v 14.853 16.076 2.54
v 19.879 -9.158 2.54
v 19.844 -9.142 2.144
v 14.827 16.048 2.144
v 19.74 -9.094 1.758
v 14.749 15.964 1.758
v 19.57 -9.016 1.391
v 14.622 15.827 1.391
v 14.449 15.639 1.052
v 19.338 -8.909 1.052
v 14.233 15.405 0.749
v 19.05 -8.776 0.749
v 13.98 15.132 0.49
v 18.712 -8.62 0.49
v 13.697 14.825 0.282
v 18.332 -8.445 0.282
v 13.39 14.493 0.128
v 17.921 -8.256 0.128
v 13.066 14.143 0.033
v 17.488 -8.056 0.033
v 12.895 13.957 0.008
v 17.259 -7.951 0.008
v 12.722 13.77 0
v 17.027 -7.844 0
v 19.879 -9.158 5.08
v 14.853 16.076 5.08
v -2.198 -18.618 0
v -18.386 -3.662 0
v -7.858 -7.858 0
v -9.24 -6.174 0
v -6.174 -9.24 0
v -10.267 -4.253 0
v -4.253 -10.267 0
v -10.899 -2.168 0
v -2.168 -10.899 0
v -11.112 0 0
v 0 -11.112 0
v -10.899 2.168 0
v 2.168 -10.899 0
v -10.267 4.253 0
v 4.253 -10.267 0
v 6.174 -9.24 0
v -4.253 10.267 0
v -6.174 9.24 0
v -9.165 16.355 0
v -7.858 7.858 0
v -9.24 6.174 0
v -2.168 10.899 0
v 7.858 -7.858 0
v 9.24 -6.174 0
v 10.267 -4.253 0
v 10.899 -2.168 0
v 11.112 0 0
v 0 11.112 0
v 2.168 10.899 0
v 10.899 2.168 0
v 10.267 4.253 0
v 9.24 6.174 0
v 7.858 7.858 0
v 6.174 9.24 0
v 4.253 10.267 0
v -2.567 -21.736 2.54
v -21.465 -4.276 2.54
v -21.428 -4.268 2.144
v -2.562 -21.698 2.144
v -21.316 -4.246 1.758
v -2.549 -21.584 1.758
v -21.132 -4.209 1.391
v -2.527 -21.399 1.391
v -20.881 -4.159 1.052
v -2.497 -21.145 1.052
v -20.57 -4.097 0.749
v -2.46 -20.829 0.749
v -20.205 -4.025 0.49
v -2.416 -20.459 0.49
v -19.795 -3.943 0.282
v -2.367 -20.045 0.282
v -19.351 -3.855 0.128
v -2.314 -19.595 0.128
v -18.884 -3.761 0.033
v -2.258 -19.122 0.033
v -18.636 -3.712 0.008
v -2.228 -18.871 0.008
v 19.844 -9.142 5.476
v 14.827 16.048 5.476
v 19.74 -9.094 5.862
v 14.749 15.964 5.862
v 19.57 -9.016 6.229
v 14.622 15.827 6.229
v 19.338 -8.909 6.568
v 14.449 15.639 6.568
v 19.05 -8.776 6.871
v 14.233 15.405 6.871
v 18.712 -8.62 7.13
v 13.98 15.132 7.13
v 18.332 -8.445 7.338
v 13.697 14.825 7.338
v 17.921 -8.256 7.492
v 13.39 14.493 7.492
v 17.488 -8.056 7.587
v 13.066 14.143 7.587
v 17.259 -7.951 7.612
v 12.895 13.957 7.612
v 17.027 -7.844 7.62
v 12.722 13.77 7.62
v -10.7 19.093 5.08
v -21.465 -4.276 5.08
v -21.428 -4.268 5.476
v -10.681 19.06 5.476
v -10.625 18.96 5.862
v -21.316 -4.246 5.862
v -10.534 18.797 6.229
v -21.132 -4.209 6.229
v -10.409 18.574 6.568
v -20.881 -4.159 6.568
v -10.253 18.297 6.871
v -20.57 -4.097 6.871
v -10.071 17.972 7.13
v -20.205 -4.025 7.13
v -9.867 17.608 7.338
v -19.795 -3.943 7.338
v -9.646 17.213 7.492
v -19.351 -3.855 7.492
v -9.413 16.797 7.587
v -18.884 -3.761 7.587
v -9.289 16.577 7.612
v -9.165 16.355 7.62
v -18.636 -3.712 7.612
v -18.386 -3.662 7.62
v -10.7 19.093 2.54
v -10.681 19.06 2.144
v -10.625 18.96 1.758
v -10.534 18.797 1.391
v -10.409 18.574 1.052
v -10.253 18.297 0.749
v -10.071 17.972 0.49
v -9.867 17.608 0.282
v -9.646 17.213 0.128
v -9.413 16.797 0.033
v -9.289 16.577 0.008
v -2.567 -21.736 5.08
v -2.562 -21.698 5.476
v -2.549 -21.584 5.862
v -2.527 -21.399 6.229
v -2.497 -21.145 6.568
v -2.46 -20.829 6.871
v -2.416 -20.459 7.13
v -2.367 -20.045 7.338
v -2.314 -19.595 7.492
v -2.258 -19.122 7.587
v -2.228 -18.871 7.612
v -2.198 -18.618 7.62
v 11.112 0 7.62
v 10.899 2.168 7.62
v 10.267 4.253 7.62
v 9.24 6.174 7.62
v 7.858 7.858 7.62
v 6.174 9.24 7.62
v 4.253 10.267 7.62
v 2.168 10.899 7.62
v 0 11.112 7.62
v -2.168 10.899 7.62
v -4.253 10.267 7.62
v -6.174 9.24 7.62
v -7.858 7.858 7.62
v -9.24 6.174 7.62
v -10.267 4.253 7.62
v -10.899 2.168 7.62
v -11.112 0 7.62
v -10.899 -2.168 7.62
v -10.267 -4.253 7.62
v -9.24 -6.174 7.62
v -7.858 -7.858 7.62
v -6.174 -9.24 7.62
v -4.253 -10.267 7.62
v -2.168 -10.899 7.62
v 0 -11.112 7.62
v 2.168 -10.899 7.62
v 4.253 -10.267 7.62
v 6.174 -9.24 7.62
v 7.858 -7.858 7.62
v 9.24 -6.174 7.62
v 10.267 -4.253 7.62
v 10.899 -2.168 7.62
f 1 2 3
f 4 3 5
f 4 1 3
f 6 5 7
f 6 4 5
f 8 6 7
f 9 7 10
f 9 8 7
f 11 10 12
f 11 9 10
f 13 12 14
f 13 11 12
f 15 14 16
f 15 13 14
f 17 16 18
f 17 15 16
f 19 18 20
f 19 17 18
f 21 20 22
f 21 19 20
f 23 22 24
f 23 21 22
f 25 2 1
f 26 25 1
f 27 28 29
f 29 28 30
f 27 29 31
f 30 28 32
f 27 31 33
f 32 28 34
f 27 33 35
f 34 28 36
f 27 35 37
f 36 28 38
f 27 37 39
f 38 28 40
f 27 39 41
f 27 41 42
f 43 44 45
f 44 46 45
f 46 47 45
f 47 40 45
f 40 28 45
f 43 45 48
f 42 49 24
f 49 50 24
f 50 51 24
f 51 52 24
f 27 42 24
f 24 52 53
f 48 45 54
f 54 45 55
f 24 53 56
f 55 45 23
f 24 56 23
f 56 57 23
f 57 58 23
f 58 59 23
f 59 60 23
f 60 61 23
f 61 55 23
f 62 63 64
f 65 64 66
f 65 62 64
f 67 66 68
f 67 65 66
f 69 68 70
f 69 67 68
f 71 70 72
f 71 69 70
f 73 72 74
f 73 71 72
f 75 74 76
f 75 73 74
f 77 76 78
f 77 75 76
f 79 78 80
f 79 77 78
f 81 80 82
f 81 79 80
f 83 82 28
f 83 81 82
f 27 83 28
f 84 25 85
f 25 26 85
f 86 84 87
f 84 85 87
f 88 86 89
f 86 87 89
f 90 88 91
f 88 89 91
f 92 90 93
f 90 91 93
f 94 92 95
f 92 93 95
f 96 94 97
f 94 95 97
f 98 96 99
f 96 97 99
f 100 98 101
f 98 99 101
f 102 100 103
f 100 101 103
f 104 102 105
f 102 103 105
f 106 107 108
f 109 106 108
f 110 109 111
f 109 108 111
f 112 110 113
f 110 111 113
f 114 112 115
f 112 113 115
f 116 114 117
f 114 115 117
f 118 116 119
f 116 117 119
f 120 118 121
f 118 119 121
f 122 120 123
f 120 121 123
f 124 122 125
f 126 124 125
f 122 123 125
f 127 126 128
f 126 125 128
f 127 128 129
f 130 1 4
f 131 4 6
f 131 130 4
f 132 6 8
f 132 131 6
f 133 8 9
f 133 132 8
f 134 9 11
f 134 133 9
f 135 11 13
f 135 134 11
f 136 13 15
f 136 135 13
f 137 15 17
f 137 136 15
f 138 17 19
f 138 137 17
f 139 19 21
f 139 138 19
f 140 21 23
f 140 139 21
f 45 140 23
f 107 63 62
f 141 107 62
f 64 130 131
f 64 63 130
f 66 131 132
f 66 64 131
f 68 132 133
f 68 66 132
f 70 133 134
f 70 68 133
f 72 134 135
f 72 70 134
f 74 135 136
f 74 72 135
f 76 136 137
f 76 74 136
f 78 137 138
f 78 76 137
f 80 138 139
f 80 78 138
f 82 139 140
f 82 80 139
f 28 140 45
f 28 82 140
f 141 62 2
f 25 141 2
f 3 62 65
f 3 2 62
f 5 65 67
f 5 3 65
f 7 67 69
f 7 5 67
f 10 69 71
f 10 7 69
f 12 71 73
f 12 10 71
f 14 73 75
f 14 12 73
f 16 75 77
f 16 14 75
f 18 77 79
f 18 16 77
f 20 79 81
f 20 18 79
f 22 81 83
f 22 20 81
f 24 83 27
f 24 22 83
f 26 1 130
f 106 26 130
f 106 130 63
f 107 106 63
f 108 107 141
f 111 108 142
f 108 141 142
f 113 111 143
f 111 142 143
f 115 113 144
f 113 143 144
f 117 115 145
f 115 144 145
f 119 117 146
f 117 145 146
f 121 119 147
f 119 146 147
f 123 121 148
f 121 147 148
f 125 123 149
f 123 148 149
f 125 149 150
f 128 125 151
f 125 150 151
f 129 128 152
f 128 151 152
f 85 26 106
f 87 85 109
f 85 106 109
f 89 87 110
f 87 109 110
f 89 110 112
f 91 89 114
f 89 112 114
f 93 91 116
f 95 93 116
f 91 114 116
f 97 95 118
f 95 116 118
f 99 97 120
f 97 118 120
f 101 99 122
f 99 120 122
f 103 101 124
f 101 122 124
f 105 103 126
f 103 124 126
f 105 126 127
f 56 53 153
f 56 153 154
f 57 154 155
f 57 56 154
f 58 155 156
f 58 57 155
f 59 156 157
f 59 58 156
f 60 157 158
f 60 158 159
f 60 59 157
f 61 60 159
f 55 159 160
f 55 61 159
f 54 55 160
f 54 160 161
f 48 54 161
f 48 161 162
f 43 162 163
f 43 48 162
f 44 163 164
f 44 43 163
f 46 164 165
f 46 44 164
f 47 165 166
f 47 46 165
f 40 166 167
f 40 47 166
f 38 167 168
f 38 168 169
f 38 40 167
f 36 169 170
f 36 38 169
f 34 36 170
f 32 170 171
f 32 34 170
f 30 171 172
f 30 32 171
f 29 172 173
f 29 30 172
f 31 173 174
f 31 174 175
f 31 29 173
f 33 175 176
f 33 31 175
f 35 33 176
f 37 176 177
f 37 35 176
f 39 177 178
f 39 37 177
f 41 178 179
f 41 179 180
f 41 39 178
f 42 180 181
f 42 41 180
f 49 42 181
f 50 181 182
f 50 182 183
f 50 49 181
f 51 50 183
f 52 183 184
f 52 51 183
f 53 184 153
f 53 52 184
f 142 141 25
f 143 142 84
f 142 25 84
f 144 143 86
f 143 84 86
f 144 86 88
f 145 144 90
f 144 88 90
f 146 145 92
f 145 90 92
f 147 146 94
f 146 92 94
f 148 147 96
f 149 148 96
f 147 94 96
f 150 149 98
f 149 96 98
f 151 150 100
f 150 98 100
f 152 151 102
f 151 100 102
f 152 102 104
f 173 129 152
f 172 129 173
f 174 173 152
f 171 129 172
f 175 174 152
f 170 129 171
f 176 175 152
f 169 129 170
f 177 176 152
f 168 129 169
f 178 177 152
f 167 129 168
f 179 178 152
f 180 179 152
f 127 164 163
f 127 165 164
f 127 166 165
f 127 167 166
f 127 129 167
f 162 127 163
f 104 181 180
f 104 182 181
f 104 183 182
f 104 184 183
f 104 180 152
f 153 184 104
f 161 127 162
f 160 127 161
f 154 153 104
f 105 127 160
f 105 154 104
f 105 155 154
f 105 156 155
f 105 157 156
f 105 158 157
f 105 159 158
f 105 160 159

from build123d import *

# Parameters (mm, degrees)
F0_R     = 11.1125
F1_DEPTH = 7.62
F2_R     = 2.54


with BuildPart() as f1:
    # F0 (on Top) → F1 (new body)
    with BuildSketch(Plane.XY):
        Polygon((-2.56667, -21.73599), (19.87901, -9.157839), (14.852574, 16.076135), (-10.699615, 19.093436), (-21.4653, -4.275742), align=None)
        Circle(F0_R, mode=Mode.SUBTRACT)
    extrude(amount=F1_DEPTH)

    # F2
    f2_edges = [f1.edges().sort_by_distance(p)[0] for p in [
        (-12.015985, -13.005866, 7.62),
        (8.65617, -15.446914, 7.62),
        (17.365792, 3.459148, 7.62),
        (2.07648, 17.584785, 7.62),
        (-16.082457, 7.408847, 7.62),
        (8.65617, -15.446914, 0),
        (-12.015985, -13.005866, 0),
        (-16.082457, 7.408847, 0),
        (2.07648, 17.584785, 0),
        (17.365792, 3.459148, 0),
    ]]
    fillet(f2_edges, radius=F2_R)


solid = f1.part
